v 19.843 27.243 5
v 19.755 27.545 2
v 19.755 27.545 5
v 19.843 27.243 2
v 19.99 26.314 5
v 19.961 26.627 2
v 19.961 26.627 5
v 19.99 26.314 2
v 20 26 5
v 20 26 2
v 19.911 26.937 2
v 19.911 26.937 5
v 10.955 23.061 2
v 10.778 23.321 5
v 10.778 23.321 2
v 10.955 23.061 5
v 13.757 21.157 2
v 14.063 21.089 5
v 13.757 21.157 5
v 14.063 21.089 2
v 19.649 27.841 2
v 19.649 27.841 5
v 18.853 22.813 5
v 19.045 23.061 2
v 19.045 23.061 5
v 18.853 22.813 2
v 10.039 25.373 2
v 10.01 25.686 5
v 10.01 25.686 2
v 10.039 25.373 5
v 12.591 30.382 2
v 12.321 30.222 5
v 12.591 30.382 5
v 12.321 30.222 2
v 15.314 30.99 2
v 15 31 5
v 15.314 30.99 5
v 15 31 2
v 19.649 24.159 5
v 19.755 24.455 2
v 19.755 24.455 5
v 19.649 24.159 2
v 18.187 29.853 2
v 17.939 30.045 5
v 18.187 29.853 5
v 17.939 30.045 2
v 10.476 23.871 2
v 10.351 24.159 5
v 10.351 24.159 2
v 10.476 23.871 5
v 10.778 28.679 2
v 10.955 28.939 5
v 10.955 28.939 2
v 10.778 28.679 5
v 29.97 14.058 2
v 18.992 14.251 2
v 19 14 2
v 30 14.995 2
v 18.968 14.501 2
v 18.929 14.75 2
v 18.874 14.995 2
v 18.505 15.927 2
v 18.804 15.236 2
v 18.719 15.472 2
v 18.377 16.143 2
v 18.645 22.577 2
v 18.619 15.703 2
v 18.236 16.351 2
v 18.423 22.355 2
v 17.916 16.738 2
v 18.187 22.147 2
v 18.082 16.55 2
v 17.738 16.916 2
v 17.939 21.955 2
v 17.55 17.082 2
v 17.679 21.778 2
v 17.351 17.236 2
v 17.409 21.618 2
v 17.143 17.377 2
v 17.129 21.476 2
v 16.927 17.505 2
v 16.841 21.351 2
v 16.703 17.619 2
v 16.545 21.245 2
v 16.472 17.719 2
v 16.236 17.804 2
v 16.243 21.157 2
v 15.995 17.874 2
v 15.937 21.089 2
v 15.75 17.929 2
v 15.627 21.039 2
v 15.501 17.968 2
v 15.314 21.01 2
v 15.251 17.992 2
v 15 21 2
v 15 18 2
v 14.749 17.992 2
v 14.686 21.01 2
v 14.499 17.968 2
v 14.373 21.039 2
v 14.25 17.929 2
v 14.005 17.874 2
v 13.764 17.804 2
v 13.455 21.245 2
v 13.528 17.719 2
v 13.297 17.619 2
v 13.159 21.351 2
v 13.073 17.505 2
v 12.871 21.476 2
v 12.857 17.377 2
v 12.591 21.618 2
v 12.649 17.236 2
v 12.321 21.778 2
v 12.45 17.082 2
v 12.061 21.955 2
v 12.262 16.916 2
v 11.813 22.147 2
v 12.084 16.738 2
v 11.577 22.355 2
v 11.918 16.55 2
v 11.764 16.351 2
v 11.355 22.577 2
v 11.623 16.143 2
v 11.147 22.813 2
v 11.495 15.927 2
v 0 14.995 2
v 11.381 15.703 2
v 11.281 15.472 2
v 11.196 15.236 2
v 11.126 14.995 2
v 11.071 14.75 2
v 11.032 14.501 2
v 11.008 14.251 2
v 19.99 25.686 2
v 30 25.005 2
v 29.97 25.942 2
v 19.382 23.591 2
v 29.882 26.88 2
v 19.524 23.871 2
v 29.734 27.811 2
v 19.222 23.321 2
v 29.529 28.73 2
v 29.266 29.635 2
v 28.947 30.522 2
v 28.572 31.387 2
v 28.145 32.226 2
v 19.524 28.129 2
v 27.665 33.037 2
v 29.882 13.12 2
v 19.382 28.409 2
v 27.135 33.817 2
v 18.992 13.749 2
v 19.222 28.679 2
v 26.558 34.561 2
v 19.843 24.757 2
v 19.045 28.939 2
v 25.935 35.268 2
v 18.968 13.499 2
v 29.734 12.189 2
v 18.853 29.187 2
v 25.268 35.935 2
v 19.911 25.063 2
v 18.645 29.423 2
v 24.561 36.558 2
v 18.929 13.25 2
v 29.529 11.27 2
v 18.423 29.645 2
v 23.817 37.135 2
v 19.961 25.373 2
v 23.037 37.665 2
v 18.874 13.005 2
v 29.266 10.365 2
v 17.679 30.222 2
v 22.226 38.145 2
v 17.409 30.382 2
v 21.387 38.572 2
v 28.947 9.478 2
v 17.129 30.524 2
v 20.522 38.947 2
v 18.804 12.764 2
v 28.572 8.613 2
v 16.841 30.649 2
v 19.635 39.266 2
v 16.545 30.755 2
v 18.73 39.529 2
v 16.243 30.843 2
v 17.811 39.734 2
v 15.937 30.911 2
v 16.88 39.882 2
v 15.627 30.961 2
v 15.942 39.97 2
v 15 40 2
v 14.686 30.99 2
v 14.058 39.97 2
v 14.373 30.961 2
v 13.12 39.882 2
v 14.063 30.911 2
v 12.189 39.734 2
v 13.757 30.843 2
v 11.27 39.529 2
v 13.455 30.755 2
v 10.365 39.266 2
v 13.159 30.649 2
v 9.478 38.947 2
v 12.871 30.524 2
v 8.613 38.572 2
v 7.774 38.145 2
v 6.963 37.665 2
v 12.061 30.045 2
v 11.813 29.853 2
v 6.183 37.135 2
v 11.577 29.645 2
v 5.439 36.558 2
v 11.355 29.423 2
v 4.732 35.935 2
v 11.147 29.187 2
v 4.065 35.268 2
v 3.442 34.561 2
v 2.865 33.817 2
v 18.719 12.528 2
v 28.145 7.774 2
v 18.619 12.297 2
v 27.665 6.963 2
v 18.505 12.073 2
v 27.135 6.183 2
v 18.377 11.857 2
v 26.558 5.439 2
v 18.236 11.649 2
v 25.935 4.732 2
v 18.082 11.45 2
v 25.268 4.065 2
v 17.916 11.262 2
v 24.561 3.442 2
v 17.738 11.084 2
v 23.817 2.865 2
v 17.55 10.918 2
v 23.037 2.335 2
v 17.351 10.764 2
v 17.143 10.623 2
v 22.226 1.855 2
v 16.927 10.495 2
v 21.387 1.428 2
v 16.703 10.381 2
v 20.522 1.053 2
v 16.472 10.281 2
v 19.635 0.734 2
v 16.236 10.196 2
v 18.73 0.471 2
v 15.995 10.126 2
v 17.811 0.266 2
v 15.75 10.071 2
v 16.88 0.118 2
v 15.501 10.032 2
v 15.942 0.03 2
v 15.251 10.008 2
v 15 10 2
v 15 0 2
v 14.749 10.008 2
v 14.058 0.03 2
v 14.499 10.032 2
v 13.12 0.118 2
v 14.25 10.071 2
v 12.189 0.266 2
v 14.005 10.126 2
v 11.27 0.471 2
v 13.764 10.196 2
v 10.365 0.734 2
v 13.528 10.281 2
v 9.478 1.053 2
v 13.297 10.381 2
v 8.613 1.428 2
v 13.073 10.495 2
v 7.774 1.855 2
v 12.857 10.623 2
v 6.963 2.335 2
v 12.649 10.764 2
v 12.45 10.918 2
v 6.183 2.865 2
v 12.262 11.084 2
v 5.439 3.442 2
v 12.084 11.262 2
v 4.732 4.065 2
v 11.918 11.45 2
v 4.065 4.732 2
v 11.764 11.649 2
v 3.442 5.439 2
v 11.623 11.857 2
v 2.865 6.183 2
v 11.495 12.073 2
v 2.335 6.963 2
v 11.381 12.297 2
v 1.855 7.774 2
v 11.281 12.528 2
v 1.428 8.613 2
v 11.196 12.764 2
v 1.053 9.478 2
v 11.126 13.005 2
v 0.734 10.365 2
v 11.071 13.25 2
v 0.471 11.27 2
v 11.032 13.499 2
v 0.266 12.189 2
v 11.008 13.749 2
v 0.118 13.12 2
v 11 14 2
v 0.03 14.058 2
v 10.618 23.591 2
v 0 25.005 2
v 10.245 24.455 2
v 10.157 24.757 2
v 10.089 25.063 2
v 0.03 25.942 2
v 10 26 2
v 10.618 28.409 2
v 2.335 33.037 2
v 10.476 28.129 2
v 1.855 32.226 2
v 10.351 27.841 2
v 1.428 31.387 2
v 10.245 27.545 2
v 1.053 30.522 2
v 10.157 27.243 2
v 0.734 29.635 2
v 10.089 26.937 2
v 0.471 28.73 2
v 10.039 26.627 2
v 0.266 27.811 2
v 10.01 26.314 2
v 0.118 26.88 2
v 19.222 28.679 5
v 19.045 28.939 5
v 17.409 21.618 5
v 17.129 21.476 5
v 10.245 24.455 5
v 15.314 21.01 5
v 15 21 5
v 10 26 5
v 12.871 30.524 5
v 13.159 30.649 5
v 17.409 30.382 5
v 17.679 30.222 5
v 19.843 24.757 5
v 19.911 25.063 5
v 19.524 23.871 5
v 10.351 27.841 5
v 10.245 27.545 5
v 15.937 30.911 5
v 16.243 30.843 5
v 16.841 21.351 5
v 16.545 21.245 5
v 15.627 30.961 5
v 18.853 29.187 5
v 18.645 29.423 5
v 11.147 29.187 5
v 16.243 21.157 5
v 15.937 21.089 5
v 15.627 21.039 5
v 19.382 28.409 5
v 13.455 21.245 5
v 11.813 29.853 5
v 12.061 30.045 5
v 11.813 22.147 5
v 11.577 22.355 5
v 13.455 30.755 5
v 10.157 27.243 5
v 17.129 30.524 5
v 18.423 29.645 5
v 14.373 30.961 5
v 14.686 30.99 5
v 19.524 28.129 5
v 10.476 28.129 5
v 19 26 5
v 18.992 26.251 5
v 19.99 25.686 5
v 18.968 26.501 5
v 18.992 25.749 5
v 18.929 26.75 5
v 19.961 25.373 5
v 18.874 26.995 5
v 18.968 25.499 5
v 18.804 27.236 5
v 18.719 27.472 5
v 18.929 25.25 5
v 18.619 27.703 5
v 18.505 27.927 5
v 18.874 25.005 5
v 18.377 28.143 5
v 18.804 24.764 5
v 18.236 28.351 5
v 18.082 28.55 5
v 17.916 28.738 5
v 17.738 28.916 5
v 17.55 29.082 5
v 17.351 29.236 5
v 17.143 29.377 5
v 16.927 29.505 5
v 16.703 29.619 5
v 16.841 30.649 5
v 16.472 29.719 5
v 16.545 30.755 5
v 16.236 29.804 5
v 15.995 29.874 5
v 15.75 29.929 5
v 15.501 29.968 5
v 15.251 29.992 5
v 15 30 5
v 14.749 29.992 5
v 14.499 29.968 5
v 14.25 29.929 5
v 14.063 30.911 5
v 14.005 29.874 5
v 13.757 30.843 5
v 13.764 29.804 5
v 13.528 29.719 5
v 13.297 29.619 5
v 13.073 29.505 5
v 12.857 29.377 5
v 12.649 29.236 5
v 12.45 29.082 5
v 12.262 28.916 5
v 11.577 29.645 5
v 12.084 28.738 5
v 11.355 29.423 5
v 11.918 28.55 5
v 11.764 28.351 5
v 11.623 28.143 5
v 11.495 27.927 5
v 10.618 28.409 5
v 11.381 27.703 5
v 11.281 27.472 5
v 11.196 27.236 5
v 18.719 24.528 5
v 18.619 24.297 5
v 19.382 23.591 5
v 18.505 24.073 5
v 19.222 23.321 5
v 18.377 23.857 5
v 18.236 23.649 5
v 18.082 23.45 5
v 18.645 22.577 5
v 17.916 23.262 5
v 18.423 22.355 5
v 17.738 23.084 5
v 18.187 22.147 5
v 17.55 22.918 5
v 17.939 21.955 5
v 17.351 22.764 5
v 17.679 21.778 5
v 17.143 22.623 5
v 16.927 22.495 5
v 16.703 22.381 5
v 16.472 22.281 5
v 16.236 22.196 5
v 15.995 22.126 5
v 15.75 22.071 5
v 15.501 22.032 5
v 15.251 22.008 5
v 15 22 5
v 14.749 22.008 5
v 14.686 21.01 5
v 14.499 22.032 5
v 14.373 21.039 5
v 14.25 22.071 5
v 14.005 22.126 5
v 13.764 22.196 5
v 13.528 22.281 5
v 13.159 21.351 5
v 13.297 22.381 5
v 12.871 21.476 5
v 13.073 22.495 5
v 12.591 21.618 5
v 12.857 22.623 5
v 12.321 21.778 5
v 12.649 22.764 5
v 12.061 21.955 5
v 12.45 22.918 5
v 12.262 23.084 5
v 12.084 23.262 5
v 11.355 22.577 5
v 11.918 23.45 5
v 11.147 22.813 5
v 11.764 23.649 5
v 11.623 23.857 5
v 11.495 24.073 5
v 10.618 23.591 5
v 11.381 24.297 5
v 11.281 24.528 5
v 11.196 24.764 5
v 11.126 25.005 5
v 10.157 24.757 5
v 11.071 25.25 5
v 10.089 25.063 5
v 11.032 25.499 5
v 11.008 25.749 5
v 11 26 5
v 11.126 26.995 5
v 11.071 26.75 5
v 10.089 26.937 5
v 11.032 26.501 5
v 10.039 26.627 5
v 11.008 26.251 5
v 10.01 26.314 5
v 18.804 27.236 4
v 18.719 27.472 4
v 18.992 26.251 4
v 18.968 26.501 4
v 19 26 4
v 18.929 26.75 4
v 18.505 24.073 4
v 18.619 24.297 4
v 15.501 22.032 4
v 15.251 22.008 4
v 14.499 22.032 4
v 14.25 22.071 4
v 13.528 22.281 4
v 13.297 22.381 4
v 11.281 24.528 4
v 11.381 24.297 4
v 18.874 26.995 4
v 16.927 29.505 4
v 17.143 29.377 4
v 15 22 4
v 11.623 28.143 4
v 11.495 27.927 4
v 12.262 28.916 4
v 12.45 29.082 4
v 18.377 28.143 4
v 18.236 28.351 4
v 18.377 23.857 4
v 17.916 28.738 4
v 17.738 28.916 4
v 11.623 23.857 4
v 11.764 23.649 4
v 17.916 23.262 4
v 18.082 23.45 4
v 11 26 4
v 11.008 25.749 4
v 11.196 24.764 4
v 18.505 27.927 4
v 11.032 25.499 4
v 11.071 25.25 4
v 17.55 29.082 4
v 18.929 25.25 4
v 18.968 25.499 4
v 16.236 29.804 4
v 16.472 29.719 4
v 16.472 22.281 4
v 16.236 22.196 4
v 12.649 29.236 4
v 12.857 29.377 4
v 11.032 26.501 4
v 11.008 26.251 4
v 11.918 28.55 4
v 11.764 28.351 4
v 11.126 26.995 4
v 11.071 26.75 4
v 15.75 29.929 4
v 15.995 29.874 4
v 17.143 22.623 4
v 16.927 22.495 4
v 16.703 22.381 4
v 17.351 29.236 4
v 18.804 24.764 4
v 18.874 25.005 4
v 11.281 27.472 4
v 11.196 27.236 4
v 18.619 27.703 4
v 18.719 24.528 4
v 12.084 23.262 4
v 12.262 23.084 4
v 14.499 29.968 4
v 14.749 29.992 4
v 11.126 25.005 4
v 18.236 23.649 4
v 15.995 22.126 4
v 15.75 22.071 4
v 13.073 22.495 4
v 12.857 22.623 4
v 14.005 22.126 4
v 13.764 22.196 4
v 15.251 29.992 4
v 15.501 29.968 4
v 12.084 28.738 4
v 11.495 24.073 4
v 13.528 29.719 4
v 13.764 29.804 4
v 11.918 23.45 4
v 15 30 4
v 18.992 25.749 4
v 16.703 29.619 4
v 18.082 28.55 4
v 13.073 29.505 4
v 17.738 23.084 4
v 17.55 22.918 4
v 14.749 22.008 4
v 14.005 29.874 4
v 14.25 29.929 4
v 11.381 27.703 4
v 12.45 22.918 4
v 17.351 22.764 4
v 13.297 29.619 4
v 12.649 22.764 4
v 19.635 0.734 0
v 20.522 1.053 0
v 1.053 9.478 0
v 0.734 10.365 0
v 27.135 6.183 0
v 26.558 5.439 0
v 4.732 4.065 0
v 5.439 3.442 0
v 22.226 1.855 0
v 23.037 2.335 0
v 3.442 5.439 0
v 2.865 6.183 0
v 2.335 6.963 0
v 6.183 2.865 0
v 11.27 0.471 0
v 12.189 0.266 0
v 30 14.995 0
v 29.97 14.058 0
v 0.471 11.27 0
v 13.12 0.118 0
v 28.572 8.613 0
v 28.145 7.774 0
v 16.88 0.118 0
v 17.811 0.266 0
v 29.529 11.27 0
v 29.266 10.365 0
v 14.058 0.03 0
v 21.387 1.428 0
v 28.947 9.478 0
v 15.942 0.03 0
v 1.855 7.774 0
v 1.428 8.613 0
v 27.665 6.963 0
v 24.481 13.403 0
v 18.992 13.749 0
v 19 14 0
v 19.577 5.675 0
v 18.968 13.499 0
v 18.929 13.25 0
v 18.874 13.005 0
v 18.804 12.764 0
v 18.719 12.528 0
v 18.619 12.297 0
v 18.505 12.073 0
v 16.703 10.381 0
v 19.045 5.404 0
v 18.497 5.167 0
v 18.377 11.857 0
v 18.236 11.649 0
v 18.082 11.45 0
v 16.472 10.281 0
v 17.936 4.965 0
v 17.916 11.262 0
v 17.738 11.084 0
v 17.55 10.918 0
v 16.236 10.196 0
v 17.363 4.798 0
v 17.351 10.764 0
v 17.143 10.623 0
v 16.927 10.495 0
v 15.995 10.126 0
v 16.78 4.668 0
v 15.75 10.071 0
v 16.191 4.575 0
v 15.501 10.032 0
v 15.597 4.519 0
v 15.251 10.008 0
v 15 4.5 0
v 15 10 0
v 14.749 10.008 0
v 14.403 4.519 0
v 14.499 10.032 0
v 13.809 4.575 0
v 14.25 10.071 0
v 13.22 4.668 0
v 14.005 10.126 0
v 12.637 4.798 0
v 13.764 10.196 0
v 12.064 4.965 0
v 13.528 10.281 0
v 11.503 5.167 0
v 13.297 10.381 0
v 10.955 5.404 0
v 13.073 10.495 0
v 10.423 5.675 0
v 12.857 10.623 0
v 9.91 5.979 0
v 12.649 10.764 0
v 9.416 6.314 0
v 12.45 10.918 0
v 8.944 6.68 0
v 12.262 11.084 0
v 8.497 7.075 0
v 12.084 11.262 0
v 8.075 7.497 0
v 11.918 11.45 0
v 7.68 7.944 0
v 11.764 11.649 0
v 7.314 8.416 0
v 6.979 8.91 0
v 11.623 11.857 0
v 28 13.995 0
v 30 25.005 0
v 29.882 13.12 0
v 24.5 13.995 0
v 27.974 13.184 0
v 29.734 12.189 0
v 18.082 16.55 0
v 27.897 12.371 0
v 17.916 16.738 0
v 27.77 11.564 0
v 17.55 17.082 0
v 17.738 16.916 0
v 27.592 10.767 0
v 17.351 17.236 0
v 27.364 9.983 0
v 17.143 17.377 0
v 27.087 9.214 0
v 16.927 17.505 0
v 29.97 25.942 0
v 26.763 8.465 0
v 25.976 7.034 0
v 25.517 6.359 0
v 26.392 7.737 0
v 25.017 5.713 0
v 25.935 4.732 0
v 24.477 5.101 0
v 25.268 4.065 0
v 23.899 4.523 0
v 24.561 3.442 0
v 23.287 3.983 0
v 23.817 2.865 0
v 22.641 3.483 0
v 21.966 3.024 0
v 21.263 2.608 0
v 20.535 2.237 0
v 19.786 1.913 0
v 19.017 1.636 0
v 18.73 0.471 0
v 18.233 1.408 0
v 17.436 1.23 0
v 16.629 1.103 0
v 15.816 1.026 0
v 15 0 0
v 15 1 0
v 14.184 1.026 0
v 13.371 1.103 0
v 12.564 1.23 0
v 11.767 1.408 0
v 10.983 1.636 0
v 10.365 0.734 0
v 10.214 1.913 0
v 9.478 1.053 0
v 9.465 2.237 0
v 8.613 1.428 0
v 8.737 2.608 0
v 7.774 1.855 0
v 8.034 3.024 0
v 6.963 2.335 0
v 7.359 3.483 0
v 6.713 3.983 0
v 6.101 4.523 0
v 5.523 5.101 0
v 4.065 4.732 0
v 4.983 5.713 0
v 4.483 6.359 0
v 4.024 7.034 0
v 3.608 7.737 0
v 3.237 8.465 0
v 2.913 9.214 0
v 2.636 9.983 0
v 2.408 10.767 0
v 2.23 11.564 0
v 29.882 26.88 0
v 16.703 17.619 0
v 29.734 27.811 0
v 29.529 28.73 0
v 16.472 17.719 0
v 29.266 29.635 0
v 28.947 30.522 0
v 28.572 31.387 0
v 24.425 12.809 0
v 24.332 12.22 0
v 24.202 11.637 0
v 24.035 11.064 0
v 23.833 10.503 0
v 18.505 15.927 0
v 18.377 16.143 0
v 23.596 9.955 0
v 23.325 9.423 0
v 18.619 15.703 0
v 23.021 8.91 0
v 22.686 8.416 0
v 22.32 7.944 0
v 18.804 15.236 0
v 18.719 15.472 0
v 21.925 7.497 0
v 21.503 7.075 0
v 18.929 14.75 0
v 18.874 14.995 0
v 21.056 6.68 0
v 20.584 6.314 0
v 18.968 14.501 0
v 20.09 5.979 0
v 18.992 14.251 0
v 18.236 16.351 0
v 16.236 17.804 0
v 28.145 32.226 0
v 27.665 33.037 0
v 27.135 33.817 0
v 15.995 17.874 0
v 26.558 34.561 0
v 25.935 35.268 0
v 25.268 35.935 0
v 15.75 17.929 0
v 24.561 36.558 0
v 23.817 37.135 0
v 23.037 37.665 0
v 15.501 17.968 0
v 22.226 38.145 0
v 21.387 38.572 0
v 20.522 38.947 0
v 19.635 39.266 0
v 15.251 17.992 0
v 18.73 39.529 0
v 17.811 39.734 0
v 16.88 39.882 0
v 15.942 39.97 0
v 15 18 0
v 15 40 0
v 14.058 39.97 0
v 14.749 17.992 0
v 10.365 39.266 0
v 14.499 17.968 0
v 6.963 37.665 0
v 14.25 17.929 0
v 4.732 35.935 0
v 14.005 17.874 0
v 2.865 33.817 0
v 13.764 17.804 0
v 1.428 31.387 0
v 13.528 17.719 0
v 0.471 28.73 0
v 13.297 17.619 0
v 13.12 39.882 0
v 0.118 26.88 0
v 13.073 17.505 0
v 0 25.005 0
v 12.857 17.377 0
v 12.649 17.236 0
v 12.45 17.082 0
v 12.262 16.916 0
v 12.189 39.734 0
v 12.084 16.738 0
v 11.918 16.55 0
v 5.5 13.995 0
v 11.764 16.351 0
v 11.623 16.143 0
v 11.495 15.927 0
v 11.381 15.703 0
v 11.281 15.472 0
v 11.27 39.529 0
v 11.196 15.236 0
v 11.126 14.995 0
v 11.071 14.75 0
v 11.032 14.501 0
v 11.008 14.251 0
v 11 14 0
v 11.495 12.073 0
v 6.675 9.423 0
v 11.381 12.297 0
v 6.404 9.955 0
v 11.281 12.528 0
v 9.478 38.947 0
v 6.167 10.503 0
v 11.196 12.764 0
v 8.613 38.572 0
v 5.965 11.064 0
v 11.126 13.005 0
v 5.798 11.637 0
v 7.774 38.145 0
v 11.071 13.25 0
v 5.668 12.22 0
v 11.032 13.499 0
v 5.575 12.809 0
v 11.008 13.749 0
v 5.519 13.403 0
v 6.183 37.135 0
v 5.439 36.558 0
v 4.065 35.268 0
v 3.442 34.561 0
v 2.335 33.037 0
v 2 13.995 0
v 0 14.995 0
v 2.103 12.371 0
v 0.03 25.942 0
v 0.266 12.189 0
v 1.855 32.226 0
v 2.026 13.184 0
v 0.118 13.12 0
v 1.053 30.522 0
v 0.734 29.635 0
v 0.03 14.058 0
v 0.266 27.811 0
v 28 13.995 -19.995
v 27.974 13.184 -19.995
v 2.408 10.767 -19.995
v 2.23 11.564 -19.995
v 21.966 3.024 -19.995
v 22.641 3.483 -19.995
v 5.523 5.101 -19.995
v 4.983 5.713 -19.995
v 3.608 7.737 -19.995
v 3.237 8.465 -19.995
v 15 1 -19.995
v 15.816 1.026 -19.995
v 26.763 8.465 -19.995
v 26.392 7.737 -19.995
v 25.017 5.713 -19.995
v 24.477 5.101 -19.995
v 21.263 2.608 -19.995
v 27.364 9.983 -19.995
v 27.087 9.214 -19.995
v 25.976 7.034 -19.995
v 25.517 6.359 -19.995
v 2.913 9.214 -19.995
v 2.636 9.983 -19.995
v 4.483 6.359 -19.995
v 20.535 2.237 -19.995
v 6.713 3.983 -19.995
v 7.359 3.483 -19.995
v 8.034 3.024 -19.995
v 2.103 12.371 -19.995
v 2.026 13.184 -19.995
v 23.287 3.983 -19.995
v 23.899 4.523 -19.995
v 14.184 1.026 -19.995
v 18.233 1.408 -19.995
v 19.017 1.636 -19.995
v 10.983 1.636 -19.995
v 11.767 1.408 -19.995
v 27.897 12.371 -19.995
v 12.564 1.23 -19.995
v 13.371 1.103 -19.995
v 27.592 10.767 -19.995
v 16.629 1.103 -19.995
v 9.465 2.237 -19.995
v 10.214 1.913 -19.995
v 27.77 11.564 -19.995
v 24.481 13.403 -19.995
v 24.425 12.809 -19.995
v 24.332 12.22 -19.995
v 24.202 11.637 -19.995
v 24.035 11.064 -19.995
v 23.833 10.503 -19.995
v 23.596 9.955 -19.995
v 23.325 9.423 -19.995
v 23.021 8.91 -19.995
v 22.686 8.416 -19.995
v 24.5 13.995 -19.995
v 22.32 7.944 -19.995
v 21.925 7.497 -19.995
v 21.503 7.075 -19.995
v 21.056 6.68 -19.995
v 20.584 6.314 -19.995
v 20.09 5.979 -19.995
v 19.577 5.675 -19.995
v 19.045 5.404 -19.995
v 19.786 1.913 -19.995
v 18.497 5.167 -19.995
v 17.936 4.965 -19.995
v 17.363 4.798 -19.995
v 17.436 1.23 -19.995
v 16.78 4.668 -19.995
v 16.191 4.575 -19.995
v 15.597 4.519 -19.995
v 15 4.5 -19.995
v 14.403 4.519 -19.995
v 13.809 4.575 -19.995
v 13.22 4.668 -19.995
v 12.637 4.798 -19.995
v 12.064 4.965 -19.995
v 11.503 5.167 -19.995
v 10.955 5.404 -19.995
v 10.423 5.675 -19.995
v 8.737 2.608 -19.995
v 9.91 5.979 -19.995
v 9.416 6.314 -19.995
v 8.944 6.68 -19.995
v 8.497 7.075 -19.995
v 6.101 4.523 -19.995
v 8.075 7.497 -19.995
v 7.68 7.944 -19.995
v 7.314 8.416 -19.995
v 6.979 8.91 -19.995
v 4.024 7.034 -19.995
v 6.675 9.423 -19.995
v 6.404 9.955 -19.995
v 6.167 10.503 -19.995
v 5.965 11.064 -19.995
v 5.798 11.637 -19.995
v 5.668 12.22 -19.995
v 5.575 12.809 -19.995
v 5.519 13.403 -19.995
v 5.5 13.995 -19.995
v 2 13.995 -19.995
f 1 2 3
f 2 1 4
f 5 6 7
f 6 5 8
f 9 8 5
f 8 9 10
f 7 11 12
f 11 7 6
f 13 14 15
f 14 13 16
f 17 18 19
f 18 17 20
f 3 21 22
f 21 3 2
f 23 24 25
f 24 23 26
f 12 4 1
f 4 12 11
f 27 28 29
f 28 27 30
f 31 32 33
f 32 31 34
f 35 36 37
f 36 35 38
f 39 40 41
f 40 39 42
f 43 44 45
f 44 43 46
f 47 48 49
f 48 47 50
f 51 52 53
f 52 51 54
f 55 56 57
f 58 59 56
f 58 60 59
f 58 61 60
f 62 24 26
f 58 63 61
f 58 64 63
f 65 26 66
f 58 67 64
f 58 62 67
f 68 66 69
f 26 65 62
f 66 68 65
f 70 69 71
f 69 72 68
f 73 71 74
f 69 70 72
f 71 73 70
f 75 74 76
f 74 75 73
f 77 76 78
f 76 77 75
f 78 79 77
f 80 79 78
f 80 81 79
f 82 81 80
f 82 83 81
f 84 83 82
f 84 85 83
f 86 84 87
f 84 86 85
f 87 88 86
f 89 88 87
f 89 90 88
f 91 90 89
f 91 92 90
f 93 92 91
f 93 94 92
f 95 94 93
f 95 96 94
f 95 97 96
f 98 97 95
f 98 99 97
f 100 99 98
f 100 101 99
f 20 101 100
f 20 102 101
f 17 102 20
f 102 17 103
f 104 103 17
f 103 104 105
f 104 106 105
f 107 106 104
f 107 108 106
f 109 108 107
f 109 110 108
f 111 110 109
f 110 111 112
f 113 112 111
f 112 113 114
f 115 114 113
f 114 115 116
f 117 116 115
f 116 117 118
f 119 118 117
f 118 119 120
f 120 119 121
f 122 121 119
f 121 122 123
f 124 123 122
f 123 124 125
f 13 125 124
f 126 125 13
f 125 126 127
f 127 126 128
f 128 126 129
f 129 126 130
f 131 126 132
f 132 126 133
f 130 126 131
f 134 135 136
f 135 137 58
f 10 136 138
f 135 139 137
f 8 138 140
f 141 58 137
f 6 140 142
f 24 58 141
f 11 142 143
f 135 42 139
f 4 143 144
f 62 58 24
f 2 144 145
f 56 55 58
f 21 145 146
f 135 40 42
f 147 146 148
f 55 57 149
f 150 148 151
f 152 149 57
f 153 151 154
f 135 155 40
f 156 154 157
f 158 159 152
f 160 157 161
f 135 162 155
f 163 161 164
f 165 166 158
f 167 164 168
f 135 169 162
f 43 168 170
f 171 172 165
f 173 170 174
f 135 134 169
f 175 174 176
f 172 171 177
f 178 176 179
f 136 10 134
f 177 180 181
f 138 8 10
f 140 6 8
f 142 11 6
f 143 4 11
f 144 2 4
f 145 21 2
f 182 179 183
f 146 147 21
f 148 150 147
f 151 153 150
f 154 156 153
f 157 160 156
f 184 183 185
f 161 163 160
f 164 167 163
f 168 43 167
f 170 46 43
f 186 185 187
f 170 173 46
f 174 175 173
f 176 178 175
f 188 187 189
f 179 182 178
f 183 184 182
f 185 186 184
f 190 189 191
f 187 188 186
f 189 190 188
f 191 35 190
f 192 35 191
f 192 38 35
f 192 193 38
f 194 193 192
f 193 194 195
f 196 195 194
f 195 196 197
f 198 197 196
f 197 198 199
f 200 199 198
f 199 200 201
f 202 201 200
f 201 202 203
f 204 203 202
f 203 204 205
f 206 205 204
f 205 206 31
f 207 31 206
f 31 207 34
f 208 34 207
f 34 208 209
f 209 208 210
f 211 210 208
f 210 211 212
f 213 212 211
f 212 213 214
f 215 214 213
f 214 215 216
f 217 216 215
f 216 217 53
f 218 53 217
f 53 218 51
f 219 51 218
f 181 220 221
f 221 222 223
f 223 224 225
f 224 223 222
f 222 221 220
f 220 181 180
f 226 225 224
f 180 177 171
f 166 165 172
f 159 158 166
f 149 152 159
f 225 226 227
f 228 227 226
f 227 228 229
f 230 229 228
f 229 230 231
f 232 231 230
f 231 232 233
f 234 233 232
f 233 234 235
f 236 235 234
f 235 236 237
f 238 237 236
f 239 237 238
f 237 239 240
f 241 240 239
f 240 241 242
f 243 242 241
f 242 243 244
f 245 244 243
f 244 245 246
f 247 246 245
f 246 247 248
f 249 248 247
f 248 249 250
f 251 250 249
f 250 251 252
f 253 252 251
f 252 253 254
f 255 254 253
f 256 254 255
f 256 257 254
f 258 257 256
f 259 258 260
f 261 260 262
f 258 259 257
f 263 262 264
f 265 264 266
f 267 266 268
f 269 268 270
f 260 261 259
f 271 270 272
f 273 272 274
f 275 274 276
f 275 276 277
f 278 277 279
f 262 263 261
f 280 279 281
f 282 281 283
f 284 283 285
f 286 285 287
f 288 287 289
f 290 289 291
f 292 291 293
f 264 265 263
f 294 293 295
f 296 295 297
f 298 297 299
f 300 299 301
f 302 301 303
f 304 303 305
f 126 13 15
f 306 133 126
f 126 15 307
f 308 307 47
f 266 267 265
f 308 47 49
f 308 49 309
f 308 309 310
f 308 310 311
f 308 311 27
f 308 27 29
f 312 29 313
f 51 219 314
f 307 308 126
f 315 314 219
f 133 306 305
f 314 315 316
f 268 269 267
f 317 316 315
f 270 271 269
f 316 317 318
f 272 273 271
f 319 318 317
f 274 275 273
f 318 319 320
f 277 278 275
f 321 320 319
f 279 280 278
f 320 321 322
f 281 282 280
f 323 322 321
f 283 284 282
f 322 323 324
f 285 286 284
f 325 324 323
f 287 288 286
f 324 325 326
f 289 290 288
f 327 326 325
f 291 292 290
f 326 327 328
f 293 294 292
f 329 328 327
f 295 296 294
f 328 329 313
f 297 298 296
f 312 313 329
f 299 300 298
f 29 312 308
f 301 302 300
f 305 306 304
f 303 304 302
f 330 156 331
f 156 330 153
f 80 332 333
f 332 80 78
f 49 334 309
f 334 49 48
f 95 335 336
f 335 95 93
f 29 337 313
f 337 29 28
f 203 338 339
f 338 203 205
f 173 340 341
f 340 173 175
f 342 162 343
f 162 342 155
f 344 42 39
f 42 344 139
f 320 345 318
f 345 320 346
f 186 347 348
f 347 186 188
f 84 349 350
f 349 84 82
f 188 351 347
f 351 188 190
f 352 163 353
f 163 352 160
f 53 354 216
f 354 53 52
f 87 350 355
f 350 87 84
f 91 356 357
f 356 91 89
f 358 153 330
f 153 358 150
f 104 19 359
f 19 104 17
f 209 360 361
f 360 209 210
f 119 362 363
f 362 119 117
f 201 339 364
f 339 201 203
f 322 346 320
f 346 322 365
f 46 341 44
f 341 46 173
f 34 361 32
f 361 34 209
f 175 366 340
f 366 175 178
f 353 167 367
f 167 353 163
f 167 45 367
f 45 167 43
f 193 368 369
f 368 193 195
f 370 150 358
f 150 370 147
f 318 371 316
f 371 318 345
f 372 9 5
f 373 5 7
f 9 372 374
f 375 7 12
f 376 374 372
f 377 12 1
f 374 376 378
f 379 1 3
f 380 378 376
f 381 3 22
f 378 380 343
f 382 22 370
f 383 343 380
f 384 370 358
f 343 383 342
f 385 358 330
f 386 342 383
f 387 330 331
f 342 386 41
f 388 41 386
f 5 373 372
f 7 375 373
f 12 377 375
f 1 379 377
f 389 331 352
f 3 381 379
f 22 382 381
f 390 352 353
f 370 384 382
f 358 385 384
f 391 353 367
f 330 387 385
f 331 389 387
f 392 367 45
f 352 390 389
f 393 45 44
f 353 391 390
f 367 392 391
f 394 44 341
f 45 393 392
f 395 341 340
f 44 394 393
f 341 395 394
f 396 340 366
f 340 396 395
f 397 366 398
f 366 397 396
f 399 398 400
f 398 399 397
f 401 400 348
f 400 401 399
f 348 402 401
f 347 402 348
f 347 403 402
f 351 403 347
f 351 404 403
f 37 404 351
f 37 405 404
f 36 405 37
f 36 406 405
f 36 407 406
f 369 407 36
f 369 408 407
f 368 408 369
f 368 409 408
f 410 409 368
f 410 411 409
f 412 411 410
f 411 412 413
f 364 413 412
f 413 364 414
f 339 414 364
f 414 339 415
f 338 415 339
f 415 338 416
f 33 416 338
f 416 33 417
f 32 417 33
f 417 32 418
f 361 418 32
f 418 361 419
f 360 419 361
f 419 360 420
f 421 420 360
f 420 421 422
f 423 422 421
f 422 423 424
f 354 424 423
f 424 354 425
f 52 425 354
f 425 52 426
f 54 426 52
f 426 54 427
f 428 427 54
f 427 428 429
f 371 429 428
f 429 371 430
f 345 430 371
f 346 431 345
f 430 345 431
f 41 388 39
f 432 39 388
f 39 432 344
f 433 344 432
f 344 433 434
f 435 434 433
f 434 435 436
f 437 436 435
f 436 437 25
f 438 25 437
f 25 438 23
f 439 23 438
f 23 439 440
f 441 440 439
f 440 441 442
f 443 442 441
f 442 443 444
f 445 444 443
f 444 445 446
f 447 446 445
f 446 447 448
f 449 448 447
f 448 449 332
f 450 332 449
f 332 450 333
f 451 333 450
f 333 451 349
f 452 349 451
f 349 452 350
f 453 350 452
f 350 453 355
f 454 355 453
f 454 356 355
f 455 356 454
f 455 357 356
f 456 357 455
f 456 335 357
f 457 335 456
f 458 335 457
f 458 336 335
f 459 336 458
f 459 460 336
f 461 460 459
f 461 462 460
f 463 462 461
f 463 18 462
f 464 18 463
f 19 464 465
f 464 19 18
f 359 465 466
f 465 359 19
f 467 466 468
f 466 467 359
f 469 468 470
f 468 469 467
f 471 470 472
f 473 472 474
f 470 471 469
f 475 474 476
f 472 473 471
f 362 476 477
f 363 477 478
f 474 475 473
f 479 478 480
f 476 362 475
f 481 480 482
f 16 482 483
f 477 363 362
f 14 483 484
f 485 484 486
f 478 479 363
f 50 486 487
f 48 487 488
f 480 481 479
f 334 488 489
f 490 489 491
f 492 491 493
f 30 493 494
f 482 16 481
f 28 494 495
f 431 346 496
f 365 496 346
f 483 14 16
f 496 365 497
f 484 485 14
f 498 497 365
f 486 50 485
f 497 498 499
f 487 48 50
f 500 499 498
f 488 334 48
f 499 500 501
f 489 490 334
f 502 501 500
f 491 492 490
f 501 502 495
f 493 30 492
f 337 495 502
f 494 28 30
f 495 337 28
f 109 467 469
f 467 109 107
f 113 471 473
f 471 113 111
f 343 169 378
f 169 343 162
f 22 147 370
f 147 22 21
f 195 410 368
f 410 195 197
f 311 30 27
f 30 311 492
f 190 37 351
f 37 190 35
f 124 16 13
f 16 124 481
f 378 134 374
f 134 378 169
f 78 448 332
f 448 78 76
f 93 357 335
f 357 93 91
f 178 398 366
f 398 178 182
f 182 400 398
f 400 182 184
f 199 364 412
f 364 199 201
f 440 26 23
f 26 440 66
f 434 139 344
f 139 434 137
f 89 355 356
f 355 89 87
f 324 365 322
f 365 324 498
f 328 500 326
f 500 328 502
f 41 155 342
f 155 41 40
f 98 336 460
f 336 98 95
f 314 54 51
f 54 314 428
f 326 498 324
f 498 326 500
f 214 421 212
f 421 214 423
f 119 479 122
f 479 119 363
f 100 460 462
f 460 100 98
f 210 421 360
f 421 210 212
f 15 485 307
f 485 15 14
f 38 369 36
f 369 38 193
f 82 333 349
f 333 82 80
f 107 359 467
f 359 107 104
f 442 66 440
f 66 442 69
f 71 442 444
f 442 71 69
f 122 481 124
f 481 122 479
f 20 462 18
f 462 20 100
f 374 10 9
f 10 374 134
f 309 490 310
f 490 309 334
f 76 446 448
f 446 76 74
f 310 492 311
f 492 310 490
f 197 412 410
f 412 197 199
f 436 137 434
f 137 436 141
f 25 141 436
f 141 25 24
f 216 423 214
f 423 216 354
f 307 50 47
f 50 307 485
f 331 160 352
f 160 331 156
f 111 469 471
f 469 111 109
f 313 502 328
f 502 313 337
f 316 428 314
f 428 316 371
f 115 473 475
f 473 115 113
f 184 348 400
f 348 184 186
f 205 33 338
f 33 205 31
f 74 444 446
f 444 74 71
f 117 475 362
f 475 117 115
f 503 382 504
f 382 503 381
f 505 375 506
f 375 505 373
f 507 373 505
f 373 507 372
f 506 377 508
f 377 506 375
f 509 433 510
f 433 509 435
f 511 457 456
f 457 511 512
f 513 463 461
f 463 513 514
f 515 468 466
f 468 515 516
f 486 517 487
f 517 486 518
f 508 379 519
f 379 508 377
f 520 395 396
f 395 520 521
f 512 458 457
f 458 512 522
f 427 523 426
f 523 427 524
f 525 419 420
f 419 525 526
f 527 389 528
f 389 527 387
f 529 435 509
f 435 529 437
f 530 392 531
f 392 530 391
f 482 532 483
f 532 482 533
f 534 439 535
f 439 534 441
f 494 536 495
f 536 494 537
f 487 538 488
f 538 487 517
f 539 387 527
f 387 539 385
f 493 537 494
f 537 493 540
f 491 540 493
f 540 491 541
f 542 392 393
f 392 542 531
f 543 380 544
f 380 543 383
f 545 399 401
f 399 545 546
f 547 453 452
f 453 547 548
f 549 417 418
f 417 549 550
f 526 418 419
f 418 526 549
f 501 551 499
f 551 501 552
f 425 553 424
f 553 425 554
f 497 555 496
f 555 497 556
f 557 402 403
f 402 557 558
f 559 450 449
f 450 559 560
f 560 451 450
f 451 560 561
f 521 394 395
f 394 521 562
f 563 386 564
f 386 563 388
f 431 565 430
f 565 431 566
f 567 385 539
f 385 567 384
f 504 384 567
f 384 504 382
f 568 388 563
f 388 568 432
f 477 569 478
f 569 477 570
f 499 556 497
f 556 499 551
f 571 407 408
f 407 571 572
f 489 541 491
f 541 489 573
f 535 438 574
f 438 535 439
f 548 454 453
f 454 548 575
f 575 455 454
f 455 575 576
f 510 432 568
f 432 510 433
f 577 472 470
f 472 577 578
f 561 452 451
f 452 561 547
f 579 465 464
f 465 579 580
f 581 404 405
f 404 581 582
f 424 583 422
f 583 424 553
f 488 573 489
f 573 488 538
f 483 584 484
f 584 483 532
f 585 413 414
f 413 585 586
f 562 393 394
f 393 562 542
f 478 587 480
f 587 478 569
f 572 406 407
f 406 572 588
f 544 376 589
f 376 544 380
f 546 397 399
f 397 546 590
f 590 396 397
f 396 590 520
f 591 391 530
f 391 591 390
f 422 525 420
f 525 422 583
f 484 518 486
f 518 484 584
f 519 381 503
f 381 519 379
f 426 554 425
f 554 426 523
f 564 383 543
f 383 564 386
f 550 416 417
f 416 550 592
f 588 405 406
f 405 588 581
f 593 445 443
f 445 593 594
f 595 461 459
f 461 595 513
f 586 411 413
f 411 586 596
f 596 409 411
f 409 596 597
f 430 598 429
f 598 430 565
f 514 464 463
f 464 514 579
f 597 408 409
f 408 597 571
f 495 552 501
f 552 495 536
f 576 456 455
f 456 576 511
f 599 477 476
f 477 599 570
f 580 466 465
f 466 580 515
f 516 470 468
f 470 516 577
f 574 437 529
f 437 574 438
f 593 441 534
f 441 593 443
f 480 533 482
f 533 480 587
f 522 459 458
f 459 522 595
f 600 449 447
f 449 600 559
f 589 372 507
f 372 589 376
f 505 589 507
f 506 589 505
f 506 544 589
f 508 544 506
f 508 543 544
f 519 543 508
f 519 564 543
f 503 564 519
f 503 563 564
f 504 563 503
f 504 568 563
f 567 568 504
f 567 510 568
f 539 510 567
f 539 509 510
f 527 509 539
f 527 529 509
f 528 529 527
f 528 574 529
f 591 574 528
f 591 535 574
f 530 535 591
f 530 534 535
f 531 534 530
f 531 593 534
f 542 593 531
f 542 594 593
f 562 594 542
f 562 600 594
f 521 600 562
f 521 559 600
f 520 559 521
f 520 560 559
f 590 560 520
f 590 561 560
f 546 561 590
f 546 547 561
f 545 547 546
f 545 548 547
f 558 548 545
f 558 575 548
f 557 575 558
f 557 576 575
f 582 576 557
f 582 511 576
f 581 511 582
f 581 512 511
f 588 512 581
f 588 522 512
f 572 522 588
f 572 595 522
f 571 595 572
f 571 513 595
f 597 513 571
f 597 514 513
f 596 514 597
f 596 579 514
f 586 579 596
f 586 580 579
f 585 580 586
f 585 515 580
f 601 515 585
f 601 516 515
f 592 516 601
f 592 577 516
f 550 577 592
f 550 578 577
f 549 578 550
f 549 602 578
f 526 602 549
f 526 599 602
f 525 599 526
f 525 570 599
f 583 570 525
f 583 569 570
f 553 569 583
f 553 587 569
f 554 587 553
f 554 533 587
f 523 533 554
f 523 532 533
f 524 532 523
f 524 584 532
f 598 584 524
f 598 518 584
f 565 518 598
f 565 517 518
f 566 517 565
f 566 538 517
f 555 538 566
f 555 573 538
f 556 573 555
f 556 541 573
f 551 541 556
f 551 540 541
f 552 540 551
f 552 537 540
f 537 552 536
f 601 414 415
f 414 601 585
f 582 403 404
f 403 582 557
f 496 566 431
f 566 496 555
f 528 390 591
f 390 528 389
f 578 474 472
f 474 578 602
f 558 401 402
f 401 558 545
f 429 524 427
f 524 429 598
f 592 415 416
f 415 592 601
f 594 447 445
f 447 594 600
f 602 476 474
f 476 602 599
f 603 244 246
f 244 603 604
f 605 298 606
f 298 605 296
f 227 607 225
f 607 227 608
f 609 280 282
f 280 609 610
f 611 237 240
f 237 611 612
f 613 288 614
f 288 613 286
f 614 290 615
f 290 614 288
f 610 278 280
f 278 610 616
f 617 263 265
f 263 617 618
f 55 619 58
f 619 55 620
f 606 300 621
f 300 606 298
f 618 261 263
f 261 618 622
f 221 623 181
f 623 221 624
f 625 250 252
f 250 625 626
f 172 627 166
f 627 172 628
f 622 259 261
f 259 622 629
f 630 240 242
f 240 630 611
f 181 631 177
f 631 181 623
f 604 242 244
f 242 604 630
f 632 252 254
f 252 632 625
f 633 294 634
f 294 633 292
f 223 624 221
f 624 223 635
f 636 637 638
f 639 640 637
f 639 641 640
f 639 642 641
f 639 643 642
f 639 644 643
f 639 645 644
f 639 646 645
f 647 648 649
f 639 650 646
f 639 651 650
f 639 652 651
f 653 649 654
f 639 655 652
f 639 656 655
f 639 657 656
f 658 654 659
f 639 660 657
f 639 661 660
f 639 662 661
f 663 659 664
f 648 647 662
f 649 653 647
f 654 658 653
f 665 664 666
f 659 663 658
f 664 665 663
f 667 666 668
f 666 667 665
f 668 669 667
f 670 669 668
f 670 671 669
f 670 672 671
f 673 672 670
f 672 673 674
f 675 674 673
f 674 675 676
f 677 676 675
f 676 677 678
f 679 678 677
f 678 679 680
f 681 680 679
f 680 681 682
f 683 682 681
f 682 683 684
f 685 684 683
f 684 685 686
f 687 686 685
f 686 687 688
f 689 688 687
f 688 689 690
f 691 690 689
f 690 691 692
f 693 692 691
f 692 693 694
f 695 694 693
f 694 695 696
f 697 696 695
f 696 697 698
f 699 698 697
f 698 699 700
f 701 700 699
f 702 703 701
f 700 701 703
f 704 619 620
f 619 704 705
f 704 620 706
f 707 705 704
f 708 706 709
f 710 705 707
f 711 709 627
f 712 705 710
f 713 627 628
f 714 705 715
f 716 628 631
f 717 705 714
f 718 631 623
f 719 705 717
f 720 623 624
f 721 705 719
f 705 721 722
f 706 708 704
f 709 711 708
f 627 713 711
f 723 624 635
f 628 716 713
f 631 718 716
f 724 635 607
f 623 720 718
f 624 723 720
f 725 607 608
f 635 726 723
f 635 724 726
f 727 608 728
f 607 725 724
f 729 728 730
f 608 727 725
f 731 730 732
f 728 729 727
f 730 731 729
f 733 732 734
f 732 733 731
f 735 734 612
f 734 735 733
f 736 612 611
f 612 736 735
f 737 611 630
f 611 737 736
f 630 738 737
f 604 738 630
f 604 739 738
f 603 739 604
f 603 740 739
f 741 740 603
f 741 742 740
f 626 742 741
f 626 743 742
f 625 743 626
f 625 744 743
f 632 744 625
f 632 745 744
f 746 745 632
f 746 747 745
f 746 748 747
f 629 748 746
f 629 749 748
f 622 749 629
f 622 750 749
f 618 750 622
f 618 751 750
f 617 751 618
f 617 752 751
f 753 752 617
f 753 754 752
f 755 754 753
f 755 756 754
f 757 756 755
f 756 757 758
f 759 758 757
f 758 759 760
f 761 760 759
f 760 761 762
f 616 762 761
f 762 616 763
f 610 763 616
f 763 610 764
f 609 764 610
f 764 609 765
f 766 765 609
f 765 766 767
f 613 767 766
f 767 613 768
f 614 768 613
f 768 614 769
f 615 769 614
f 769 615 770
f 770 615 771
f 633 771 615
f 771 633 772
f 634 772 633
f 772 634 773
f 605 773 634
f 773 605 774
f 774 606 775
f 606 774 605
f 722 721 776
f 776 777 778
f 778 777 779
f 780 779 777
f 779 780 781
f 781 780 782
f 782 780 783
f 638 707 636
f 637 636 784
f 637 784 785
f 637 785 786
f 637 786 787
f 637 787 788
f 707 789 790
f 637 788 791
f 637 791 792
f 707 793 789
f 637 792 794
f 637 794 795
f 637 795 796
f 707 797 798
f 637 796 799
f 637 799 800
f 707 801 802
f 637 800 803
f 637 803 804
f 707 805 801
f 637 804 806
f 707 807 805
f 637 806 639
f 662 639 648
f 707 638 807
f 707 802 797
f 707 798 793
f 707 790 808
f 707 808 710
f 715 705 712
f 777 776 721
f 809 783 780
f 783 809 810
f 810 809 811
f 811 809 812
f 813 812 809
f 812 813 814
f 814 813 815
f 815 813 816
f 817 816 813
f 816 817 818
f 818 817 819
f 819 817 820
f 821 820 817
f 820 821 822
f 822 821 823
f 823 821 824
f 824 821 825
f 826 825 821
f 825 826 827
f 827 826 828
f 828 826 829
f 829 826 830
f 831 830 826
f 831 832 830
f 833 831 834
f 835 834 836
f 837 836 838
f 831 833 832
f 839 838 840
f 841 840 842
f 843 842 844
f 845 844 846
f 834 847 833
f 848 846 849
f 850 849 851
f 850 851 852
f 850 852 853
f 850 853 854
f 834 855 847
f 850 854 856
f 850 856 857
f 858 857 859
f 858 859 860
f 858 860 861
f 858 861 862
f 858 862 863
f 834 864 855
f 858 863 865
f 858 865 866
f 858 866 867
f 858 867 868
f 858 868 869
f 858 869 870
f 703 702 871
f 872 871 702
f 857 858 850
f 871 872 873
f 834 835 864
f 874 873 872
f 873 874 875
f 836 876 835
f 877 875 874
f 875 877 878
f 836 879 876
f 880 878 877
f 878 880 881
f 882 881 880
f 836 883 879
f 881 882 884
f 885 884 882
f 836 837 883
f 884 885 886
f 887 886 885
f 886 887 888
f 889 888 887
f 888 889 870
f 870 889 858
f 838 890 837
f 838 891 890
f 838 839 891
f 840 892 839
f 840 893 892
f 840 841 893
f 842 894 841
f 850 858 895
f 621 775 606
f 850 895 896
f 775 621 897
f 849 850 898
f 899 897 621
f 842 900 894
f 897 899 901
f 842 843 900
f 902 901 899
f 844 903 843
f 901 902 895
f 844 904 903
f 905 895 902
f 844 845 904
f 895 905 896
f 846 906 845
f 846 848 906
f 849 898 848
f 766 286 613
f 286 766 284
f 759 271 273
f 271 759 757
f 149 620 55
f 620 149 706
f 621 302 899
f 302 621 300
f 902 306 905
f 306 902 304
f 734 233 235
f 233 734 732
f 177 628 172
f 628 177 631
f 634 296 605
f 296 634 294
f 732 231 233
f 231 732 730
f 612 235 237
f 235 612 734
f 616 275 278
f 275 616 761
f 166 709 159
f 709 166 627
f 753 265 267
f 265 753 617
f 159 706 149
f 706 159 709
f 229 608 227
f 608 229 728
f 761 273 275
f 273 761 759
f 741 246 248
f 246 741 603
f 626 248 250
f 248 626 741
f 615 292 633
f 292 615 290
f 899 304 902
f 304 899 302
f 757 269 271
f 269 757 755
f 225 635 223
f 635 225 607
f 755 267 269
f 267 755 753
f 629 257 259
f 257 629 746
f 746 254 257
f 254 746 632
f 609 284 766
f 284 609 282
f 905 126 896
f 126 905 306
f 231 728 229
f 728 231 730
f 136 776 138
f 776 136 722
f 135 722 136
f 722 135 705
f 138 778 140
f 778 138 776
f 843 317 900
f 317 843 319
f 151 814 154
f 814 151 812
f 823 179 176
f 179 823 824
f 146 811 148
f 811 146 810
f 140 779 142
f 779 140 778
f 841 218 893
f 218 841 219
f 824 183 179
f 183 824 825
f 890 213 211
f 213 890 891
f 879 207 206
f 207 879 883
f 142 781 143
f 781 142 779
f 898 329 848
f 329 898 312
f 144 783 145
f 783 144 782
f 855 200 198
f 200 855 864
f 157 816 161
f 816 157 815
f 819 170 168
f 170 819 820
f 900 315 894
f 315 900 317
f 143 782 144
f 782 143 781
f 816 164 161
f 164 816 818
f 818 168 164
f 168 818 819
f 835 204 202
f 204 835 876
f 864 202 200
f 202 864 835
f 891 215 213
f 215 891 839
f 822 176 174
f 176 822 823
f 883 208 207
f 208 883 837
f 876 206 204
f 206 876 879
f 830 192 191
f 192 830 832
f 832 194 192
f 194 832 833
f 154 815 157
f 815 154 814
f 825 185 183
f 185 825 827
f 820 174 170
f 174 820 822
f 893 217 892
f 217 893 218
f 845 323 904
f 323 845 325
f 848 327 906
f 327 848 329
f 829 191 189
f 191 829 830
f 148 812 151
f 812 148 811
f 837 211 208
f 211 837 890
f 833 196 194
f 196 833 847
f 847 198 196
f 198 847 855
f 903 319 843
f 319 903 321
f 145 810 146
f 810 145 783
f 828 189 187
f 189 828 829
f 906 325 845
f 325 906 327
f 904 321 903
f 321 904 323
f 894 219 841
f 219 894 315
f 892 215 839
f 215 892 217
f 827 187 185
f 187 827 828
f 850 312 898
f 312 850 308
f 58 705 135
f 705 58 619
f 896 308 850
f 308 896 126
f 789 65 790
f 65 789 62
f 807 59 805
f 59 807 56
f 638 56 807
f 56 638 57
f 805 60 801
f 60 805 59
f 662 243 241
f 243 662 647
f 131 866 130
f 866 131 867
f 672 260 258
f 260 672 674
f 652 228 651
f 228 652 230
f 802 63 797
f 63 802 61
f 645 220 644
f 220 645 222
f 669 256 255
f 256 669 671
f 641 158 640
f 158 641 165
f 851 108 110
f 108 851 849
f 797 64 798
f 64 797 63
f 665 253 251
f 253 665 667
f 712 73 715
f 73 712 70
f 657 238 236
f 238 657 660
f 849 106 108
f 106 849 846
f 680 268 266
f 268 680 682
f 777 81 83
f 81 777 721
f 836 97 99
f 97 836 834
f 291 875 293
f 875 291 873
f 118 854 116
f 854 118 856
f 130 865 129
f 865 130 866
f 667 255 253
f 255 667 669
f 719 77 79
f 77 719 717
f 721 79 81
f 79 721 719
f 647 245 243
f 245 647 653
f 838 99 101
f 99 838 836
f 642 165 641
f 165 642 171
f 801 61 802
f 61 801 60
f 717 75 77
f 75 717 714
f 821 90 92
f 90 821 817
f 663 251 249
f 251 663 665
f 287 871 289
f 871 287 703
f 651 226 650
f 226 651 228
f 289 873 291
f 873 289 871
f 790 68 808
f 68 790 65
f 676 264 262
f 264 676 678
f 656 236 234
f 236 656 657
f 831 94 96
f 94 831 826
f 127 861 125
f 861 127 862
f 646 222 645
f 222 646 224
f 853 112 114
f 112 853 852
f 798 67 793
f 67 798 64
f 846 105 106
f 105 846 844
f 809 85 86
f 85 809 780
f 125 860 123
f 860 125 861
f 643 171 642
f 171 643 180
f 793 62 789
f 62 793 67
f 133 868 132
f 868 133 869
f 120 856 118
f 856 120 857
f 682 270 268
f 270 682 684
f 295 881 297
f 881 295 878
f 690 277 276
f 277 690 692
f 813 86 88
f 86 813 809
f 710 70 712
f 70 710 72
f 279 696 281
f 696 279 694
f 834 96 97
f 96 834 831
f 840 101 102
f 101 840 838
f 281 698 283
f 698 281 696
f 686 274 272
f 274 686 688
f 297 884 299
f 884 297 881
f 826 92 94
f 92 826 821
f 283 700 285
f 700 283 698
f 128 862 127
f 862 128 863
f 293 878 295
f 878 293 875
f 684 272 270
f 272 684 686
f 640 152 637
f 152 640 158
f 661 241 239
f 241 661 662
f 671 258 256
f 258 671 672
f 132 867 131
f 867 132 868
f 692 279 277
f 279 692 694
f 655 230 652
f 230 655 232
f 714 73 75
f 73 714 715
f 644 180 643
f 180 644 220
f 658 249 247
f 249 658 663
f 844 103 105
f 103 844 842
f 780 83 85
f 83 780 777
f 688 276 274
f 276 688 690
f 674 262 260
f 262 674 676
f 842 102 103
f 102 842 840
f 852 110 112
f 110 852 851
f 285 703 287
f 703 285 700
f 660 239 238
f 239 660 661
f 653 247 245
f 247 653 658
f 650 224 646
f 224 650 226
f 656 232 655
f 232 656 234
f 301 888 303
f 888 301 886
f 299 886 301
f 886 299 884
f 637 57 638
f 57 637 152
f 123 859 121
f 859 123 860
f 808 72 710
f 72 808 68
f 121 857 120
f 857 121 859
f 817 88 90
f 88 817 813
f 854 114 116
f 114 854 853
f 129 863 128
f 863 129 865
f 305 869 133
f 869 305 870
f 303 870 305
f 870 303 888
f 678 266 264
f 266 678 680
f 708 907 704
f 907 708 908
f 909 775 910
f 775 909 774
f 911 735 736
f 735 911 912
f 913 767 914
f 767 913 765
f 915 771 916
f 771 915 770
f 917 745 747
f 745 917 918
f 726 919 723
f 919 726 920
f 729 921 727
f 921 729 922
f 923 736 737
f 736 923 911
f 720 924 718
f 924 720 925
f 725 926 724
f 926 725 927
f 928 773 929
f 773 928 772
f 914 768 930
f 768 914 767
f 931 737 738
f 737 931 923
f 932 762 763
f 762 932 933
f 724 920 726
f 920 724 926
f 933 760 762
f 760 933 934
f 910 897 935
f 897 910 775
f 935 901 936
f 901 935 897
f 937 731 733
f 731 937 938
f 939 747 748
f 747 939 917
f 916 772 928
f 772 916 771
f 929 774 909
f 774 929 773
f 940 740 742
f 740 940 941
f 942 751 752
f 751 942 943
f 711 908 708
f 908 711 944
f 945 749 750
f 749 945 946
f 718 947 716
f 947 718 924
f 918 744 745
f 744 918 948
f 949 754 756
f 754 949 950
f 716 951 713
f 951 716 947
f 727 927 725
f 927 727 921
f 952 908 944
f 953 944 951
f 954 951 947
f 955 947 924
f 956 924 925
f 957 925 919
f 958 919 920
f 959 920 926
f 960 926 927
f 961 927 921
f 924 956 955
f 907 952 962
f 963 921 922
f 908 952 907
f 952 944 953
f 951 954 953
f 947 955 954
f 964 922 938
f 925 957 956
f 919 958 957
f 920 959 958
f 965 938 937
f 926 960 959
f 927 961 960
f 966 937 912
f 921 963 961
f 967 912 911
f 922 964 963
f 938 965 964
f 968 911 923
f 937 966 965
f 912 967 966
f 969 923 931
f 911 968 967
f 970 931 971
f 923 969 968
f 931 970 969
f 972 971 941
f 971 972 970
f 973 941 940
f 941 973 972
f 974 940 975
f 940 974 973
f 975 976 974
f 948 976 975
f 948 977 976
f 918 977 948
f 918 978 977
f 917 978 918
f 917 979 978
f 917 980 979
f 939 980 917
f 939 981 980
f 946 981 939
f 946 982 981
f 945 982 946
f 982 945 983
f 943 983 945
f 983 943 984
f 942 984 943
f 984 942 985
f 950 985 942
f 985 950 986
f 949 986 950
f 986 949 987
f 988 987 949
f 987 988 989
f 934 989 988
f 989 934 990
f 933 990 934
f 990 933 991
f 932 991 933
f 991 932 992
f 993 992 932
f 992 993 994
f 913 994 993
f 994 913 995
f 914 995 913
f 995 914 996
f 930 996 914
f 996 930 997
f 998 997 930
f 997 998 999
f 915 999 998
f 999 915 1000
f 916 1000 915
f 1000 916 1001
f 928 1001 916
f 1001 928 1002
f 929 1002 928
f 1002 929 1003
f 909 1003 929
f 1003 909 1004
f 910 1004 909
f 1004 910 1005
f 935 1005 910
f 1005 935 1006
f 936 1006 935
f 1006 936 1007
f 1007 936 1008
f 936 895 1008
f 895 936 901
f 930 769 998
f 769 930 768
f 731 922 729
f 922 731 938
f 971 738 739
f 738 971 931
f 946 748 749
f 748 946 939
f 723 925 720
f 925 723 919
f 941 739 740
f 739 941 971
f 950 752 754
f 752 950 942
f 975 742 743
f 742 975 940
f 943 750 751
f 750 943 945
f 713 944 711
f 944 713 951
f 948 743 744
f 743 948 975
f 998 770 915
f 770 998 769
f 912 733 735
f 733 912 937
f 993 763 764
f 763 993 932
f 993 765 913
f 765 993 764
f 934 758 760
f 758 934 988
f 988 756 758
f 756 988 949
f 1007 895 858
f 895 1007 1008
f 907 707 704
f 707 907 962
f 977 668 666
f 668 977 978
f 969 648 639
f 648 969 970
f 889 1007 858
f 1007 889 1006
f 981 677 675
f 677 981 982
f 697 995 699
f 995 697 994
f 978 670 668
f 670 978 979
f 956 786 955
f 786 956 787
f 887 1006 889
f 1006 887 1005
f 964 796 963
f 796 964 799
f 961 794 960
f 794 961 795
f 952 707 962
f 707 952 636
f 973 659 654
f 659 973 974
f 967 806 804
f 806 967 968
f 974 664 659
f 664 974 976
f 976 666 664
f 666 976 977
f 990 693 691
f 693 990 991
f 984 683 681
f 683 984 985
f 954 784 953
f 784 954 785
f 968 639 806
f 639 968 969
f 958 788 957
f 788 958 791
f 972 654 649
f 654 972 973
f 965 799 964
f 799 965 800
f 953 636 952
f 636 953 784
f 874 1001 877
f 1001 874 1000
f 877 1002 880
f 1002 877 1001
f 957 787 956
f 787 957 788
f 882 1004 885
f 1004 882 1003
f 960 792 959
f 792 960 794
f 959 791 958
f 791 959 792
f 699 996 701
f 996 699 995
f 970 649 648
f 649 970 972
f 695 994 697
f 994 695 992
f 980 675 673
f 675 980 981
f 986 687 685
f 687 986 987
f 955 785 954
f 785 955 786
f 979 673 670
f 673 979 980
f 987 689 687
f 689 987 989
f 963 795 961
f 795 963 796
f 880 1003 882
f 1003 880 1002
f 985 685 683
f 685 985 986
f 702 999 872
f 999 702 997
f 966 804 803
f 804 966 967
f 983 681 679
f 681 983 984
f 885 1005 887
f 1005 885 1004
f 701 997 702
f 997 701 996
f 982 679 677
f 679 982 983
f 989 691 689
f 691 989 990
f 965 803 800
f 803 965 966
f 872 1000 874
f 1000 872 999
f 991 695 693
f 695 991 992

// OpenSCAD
// Public parameters

base_height = 40;
base_width = 30;
base_thickness = 2;

support_distance = 12;
plastic_support_radius = 5;
plastic_support_depth = 3;
plastic_support_thickness = 2;
screw_hole_radius = 4;

channel_depth = 20;
channel_thickness = 3.5;
channel_radius = 9.5;

$fn = 100;

// PRIVATE =================================

delta = 0.01;
shift = - delta / 2;

// Modules

module plastic_support(d, r, t, x, y, z) {
    inner_r = r - (t / 2);
    translate([x,y,z]){
        difference() {
            cylinder(h = d, r = r);
                translate([0,0,t]){
                    cylinder(h = d+ delta + t, r = inner_r);
            }
        }   
    }
}

module base(w, h, t) {
    union() {
        translate([w/2,w/2,0]) {
            cylinder(h=t, r=w/2);
        }
        translate([w/2,h - w/2,0]) {
            cylinder(h=t, r=w/2);
        }
        translate([0,w/2+shift,0]) {
            cube([w, h - w + delta, t]);
        }
   }
}

module screw(r, t, x, y){
    translate([x, y, shift]) {
        cylinder(h=t+delta, r=r);
    }
}

module channel(r, t, d, x, y) {
    o_r = r + t;
    translate([x,y,-d-shift]){
        difference(){
            cylinder(h=d, r = o_r);
            translate([-o_r+shift,shift,shift]){
                cube([o_r*2+delta,o_r+delta,d+delta]);
            }
            translate([0,0, shift])
            cylinder(h=d + delta, r=r);
        }
    }
}

// Main

center_to_edge = (base_height - support_distance) / 2;

screw_hole_x = base_width/2;
screw_hole_y = center_to_edge;

plastic_support_x = screw_hole_x;
plastic_support_y = base_height - center_to_edge;

channel_x = screw_hole_x;
channel_y = screw_hole_y;

union() {        
    plastic_support(plastic_support_depth, plastic_support_radius, plastic_support_thickness, plastic_support_x, plastic_support_y, base_thickness);
    difference() {
        base(base_width, base_height, base_thickness);
        screw(screw_hole_radius, base_thickness, base_width/2,center_to_edge);
    }    channel(channel_radius, channel_thickness, channel_depth, channel_x, channel_y);
}
